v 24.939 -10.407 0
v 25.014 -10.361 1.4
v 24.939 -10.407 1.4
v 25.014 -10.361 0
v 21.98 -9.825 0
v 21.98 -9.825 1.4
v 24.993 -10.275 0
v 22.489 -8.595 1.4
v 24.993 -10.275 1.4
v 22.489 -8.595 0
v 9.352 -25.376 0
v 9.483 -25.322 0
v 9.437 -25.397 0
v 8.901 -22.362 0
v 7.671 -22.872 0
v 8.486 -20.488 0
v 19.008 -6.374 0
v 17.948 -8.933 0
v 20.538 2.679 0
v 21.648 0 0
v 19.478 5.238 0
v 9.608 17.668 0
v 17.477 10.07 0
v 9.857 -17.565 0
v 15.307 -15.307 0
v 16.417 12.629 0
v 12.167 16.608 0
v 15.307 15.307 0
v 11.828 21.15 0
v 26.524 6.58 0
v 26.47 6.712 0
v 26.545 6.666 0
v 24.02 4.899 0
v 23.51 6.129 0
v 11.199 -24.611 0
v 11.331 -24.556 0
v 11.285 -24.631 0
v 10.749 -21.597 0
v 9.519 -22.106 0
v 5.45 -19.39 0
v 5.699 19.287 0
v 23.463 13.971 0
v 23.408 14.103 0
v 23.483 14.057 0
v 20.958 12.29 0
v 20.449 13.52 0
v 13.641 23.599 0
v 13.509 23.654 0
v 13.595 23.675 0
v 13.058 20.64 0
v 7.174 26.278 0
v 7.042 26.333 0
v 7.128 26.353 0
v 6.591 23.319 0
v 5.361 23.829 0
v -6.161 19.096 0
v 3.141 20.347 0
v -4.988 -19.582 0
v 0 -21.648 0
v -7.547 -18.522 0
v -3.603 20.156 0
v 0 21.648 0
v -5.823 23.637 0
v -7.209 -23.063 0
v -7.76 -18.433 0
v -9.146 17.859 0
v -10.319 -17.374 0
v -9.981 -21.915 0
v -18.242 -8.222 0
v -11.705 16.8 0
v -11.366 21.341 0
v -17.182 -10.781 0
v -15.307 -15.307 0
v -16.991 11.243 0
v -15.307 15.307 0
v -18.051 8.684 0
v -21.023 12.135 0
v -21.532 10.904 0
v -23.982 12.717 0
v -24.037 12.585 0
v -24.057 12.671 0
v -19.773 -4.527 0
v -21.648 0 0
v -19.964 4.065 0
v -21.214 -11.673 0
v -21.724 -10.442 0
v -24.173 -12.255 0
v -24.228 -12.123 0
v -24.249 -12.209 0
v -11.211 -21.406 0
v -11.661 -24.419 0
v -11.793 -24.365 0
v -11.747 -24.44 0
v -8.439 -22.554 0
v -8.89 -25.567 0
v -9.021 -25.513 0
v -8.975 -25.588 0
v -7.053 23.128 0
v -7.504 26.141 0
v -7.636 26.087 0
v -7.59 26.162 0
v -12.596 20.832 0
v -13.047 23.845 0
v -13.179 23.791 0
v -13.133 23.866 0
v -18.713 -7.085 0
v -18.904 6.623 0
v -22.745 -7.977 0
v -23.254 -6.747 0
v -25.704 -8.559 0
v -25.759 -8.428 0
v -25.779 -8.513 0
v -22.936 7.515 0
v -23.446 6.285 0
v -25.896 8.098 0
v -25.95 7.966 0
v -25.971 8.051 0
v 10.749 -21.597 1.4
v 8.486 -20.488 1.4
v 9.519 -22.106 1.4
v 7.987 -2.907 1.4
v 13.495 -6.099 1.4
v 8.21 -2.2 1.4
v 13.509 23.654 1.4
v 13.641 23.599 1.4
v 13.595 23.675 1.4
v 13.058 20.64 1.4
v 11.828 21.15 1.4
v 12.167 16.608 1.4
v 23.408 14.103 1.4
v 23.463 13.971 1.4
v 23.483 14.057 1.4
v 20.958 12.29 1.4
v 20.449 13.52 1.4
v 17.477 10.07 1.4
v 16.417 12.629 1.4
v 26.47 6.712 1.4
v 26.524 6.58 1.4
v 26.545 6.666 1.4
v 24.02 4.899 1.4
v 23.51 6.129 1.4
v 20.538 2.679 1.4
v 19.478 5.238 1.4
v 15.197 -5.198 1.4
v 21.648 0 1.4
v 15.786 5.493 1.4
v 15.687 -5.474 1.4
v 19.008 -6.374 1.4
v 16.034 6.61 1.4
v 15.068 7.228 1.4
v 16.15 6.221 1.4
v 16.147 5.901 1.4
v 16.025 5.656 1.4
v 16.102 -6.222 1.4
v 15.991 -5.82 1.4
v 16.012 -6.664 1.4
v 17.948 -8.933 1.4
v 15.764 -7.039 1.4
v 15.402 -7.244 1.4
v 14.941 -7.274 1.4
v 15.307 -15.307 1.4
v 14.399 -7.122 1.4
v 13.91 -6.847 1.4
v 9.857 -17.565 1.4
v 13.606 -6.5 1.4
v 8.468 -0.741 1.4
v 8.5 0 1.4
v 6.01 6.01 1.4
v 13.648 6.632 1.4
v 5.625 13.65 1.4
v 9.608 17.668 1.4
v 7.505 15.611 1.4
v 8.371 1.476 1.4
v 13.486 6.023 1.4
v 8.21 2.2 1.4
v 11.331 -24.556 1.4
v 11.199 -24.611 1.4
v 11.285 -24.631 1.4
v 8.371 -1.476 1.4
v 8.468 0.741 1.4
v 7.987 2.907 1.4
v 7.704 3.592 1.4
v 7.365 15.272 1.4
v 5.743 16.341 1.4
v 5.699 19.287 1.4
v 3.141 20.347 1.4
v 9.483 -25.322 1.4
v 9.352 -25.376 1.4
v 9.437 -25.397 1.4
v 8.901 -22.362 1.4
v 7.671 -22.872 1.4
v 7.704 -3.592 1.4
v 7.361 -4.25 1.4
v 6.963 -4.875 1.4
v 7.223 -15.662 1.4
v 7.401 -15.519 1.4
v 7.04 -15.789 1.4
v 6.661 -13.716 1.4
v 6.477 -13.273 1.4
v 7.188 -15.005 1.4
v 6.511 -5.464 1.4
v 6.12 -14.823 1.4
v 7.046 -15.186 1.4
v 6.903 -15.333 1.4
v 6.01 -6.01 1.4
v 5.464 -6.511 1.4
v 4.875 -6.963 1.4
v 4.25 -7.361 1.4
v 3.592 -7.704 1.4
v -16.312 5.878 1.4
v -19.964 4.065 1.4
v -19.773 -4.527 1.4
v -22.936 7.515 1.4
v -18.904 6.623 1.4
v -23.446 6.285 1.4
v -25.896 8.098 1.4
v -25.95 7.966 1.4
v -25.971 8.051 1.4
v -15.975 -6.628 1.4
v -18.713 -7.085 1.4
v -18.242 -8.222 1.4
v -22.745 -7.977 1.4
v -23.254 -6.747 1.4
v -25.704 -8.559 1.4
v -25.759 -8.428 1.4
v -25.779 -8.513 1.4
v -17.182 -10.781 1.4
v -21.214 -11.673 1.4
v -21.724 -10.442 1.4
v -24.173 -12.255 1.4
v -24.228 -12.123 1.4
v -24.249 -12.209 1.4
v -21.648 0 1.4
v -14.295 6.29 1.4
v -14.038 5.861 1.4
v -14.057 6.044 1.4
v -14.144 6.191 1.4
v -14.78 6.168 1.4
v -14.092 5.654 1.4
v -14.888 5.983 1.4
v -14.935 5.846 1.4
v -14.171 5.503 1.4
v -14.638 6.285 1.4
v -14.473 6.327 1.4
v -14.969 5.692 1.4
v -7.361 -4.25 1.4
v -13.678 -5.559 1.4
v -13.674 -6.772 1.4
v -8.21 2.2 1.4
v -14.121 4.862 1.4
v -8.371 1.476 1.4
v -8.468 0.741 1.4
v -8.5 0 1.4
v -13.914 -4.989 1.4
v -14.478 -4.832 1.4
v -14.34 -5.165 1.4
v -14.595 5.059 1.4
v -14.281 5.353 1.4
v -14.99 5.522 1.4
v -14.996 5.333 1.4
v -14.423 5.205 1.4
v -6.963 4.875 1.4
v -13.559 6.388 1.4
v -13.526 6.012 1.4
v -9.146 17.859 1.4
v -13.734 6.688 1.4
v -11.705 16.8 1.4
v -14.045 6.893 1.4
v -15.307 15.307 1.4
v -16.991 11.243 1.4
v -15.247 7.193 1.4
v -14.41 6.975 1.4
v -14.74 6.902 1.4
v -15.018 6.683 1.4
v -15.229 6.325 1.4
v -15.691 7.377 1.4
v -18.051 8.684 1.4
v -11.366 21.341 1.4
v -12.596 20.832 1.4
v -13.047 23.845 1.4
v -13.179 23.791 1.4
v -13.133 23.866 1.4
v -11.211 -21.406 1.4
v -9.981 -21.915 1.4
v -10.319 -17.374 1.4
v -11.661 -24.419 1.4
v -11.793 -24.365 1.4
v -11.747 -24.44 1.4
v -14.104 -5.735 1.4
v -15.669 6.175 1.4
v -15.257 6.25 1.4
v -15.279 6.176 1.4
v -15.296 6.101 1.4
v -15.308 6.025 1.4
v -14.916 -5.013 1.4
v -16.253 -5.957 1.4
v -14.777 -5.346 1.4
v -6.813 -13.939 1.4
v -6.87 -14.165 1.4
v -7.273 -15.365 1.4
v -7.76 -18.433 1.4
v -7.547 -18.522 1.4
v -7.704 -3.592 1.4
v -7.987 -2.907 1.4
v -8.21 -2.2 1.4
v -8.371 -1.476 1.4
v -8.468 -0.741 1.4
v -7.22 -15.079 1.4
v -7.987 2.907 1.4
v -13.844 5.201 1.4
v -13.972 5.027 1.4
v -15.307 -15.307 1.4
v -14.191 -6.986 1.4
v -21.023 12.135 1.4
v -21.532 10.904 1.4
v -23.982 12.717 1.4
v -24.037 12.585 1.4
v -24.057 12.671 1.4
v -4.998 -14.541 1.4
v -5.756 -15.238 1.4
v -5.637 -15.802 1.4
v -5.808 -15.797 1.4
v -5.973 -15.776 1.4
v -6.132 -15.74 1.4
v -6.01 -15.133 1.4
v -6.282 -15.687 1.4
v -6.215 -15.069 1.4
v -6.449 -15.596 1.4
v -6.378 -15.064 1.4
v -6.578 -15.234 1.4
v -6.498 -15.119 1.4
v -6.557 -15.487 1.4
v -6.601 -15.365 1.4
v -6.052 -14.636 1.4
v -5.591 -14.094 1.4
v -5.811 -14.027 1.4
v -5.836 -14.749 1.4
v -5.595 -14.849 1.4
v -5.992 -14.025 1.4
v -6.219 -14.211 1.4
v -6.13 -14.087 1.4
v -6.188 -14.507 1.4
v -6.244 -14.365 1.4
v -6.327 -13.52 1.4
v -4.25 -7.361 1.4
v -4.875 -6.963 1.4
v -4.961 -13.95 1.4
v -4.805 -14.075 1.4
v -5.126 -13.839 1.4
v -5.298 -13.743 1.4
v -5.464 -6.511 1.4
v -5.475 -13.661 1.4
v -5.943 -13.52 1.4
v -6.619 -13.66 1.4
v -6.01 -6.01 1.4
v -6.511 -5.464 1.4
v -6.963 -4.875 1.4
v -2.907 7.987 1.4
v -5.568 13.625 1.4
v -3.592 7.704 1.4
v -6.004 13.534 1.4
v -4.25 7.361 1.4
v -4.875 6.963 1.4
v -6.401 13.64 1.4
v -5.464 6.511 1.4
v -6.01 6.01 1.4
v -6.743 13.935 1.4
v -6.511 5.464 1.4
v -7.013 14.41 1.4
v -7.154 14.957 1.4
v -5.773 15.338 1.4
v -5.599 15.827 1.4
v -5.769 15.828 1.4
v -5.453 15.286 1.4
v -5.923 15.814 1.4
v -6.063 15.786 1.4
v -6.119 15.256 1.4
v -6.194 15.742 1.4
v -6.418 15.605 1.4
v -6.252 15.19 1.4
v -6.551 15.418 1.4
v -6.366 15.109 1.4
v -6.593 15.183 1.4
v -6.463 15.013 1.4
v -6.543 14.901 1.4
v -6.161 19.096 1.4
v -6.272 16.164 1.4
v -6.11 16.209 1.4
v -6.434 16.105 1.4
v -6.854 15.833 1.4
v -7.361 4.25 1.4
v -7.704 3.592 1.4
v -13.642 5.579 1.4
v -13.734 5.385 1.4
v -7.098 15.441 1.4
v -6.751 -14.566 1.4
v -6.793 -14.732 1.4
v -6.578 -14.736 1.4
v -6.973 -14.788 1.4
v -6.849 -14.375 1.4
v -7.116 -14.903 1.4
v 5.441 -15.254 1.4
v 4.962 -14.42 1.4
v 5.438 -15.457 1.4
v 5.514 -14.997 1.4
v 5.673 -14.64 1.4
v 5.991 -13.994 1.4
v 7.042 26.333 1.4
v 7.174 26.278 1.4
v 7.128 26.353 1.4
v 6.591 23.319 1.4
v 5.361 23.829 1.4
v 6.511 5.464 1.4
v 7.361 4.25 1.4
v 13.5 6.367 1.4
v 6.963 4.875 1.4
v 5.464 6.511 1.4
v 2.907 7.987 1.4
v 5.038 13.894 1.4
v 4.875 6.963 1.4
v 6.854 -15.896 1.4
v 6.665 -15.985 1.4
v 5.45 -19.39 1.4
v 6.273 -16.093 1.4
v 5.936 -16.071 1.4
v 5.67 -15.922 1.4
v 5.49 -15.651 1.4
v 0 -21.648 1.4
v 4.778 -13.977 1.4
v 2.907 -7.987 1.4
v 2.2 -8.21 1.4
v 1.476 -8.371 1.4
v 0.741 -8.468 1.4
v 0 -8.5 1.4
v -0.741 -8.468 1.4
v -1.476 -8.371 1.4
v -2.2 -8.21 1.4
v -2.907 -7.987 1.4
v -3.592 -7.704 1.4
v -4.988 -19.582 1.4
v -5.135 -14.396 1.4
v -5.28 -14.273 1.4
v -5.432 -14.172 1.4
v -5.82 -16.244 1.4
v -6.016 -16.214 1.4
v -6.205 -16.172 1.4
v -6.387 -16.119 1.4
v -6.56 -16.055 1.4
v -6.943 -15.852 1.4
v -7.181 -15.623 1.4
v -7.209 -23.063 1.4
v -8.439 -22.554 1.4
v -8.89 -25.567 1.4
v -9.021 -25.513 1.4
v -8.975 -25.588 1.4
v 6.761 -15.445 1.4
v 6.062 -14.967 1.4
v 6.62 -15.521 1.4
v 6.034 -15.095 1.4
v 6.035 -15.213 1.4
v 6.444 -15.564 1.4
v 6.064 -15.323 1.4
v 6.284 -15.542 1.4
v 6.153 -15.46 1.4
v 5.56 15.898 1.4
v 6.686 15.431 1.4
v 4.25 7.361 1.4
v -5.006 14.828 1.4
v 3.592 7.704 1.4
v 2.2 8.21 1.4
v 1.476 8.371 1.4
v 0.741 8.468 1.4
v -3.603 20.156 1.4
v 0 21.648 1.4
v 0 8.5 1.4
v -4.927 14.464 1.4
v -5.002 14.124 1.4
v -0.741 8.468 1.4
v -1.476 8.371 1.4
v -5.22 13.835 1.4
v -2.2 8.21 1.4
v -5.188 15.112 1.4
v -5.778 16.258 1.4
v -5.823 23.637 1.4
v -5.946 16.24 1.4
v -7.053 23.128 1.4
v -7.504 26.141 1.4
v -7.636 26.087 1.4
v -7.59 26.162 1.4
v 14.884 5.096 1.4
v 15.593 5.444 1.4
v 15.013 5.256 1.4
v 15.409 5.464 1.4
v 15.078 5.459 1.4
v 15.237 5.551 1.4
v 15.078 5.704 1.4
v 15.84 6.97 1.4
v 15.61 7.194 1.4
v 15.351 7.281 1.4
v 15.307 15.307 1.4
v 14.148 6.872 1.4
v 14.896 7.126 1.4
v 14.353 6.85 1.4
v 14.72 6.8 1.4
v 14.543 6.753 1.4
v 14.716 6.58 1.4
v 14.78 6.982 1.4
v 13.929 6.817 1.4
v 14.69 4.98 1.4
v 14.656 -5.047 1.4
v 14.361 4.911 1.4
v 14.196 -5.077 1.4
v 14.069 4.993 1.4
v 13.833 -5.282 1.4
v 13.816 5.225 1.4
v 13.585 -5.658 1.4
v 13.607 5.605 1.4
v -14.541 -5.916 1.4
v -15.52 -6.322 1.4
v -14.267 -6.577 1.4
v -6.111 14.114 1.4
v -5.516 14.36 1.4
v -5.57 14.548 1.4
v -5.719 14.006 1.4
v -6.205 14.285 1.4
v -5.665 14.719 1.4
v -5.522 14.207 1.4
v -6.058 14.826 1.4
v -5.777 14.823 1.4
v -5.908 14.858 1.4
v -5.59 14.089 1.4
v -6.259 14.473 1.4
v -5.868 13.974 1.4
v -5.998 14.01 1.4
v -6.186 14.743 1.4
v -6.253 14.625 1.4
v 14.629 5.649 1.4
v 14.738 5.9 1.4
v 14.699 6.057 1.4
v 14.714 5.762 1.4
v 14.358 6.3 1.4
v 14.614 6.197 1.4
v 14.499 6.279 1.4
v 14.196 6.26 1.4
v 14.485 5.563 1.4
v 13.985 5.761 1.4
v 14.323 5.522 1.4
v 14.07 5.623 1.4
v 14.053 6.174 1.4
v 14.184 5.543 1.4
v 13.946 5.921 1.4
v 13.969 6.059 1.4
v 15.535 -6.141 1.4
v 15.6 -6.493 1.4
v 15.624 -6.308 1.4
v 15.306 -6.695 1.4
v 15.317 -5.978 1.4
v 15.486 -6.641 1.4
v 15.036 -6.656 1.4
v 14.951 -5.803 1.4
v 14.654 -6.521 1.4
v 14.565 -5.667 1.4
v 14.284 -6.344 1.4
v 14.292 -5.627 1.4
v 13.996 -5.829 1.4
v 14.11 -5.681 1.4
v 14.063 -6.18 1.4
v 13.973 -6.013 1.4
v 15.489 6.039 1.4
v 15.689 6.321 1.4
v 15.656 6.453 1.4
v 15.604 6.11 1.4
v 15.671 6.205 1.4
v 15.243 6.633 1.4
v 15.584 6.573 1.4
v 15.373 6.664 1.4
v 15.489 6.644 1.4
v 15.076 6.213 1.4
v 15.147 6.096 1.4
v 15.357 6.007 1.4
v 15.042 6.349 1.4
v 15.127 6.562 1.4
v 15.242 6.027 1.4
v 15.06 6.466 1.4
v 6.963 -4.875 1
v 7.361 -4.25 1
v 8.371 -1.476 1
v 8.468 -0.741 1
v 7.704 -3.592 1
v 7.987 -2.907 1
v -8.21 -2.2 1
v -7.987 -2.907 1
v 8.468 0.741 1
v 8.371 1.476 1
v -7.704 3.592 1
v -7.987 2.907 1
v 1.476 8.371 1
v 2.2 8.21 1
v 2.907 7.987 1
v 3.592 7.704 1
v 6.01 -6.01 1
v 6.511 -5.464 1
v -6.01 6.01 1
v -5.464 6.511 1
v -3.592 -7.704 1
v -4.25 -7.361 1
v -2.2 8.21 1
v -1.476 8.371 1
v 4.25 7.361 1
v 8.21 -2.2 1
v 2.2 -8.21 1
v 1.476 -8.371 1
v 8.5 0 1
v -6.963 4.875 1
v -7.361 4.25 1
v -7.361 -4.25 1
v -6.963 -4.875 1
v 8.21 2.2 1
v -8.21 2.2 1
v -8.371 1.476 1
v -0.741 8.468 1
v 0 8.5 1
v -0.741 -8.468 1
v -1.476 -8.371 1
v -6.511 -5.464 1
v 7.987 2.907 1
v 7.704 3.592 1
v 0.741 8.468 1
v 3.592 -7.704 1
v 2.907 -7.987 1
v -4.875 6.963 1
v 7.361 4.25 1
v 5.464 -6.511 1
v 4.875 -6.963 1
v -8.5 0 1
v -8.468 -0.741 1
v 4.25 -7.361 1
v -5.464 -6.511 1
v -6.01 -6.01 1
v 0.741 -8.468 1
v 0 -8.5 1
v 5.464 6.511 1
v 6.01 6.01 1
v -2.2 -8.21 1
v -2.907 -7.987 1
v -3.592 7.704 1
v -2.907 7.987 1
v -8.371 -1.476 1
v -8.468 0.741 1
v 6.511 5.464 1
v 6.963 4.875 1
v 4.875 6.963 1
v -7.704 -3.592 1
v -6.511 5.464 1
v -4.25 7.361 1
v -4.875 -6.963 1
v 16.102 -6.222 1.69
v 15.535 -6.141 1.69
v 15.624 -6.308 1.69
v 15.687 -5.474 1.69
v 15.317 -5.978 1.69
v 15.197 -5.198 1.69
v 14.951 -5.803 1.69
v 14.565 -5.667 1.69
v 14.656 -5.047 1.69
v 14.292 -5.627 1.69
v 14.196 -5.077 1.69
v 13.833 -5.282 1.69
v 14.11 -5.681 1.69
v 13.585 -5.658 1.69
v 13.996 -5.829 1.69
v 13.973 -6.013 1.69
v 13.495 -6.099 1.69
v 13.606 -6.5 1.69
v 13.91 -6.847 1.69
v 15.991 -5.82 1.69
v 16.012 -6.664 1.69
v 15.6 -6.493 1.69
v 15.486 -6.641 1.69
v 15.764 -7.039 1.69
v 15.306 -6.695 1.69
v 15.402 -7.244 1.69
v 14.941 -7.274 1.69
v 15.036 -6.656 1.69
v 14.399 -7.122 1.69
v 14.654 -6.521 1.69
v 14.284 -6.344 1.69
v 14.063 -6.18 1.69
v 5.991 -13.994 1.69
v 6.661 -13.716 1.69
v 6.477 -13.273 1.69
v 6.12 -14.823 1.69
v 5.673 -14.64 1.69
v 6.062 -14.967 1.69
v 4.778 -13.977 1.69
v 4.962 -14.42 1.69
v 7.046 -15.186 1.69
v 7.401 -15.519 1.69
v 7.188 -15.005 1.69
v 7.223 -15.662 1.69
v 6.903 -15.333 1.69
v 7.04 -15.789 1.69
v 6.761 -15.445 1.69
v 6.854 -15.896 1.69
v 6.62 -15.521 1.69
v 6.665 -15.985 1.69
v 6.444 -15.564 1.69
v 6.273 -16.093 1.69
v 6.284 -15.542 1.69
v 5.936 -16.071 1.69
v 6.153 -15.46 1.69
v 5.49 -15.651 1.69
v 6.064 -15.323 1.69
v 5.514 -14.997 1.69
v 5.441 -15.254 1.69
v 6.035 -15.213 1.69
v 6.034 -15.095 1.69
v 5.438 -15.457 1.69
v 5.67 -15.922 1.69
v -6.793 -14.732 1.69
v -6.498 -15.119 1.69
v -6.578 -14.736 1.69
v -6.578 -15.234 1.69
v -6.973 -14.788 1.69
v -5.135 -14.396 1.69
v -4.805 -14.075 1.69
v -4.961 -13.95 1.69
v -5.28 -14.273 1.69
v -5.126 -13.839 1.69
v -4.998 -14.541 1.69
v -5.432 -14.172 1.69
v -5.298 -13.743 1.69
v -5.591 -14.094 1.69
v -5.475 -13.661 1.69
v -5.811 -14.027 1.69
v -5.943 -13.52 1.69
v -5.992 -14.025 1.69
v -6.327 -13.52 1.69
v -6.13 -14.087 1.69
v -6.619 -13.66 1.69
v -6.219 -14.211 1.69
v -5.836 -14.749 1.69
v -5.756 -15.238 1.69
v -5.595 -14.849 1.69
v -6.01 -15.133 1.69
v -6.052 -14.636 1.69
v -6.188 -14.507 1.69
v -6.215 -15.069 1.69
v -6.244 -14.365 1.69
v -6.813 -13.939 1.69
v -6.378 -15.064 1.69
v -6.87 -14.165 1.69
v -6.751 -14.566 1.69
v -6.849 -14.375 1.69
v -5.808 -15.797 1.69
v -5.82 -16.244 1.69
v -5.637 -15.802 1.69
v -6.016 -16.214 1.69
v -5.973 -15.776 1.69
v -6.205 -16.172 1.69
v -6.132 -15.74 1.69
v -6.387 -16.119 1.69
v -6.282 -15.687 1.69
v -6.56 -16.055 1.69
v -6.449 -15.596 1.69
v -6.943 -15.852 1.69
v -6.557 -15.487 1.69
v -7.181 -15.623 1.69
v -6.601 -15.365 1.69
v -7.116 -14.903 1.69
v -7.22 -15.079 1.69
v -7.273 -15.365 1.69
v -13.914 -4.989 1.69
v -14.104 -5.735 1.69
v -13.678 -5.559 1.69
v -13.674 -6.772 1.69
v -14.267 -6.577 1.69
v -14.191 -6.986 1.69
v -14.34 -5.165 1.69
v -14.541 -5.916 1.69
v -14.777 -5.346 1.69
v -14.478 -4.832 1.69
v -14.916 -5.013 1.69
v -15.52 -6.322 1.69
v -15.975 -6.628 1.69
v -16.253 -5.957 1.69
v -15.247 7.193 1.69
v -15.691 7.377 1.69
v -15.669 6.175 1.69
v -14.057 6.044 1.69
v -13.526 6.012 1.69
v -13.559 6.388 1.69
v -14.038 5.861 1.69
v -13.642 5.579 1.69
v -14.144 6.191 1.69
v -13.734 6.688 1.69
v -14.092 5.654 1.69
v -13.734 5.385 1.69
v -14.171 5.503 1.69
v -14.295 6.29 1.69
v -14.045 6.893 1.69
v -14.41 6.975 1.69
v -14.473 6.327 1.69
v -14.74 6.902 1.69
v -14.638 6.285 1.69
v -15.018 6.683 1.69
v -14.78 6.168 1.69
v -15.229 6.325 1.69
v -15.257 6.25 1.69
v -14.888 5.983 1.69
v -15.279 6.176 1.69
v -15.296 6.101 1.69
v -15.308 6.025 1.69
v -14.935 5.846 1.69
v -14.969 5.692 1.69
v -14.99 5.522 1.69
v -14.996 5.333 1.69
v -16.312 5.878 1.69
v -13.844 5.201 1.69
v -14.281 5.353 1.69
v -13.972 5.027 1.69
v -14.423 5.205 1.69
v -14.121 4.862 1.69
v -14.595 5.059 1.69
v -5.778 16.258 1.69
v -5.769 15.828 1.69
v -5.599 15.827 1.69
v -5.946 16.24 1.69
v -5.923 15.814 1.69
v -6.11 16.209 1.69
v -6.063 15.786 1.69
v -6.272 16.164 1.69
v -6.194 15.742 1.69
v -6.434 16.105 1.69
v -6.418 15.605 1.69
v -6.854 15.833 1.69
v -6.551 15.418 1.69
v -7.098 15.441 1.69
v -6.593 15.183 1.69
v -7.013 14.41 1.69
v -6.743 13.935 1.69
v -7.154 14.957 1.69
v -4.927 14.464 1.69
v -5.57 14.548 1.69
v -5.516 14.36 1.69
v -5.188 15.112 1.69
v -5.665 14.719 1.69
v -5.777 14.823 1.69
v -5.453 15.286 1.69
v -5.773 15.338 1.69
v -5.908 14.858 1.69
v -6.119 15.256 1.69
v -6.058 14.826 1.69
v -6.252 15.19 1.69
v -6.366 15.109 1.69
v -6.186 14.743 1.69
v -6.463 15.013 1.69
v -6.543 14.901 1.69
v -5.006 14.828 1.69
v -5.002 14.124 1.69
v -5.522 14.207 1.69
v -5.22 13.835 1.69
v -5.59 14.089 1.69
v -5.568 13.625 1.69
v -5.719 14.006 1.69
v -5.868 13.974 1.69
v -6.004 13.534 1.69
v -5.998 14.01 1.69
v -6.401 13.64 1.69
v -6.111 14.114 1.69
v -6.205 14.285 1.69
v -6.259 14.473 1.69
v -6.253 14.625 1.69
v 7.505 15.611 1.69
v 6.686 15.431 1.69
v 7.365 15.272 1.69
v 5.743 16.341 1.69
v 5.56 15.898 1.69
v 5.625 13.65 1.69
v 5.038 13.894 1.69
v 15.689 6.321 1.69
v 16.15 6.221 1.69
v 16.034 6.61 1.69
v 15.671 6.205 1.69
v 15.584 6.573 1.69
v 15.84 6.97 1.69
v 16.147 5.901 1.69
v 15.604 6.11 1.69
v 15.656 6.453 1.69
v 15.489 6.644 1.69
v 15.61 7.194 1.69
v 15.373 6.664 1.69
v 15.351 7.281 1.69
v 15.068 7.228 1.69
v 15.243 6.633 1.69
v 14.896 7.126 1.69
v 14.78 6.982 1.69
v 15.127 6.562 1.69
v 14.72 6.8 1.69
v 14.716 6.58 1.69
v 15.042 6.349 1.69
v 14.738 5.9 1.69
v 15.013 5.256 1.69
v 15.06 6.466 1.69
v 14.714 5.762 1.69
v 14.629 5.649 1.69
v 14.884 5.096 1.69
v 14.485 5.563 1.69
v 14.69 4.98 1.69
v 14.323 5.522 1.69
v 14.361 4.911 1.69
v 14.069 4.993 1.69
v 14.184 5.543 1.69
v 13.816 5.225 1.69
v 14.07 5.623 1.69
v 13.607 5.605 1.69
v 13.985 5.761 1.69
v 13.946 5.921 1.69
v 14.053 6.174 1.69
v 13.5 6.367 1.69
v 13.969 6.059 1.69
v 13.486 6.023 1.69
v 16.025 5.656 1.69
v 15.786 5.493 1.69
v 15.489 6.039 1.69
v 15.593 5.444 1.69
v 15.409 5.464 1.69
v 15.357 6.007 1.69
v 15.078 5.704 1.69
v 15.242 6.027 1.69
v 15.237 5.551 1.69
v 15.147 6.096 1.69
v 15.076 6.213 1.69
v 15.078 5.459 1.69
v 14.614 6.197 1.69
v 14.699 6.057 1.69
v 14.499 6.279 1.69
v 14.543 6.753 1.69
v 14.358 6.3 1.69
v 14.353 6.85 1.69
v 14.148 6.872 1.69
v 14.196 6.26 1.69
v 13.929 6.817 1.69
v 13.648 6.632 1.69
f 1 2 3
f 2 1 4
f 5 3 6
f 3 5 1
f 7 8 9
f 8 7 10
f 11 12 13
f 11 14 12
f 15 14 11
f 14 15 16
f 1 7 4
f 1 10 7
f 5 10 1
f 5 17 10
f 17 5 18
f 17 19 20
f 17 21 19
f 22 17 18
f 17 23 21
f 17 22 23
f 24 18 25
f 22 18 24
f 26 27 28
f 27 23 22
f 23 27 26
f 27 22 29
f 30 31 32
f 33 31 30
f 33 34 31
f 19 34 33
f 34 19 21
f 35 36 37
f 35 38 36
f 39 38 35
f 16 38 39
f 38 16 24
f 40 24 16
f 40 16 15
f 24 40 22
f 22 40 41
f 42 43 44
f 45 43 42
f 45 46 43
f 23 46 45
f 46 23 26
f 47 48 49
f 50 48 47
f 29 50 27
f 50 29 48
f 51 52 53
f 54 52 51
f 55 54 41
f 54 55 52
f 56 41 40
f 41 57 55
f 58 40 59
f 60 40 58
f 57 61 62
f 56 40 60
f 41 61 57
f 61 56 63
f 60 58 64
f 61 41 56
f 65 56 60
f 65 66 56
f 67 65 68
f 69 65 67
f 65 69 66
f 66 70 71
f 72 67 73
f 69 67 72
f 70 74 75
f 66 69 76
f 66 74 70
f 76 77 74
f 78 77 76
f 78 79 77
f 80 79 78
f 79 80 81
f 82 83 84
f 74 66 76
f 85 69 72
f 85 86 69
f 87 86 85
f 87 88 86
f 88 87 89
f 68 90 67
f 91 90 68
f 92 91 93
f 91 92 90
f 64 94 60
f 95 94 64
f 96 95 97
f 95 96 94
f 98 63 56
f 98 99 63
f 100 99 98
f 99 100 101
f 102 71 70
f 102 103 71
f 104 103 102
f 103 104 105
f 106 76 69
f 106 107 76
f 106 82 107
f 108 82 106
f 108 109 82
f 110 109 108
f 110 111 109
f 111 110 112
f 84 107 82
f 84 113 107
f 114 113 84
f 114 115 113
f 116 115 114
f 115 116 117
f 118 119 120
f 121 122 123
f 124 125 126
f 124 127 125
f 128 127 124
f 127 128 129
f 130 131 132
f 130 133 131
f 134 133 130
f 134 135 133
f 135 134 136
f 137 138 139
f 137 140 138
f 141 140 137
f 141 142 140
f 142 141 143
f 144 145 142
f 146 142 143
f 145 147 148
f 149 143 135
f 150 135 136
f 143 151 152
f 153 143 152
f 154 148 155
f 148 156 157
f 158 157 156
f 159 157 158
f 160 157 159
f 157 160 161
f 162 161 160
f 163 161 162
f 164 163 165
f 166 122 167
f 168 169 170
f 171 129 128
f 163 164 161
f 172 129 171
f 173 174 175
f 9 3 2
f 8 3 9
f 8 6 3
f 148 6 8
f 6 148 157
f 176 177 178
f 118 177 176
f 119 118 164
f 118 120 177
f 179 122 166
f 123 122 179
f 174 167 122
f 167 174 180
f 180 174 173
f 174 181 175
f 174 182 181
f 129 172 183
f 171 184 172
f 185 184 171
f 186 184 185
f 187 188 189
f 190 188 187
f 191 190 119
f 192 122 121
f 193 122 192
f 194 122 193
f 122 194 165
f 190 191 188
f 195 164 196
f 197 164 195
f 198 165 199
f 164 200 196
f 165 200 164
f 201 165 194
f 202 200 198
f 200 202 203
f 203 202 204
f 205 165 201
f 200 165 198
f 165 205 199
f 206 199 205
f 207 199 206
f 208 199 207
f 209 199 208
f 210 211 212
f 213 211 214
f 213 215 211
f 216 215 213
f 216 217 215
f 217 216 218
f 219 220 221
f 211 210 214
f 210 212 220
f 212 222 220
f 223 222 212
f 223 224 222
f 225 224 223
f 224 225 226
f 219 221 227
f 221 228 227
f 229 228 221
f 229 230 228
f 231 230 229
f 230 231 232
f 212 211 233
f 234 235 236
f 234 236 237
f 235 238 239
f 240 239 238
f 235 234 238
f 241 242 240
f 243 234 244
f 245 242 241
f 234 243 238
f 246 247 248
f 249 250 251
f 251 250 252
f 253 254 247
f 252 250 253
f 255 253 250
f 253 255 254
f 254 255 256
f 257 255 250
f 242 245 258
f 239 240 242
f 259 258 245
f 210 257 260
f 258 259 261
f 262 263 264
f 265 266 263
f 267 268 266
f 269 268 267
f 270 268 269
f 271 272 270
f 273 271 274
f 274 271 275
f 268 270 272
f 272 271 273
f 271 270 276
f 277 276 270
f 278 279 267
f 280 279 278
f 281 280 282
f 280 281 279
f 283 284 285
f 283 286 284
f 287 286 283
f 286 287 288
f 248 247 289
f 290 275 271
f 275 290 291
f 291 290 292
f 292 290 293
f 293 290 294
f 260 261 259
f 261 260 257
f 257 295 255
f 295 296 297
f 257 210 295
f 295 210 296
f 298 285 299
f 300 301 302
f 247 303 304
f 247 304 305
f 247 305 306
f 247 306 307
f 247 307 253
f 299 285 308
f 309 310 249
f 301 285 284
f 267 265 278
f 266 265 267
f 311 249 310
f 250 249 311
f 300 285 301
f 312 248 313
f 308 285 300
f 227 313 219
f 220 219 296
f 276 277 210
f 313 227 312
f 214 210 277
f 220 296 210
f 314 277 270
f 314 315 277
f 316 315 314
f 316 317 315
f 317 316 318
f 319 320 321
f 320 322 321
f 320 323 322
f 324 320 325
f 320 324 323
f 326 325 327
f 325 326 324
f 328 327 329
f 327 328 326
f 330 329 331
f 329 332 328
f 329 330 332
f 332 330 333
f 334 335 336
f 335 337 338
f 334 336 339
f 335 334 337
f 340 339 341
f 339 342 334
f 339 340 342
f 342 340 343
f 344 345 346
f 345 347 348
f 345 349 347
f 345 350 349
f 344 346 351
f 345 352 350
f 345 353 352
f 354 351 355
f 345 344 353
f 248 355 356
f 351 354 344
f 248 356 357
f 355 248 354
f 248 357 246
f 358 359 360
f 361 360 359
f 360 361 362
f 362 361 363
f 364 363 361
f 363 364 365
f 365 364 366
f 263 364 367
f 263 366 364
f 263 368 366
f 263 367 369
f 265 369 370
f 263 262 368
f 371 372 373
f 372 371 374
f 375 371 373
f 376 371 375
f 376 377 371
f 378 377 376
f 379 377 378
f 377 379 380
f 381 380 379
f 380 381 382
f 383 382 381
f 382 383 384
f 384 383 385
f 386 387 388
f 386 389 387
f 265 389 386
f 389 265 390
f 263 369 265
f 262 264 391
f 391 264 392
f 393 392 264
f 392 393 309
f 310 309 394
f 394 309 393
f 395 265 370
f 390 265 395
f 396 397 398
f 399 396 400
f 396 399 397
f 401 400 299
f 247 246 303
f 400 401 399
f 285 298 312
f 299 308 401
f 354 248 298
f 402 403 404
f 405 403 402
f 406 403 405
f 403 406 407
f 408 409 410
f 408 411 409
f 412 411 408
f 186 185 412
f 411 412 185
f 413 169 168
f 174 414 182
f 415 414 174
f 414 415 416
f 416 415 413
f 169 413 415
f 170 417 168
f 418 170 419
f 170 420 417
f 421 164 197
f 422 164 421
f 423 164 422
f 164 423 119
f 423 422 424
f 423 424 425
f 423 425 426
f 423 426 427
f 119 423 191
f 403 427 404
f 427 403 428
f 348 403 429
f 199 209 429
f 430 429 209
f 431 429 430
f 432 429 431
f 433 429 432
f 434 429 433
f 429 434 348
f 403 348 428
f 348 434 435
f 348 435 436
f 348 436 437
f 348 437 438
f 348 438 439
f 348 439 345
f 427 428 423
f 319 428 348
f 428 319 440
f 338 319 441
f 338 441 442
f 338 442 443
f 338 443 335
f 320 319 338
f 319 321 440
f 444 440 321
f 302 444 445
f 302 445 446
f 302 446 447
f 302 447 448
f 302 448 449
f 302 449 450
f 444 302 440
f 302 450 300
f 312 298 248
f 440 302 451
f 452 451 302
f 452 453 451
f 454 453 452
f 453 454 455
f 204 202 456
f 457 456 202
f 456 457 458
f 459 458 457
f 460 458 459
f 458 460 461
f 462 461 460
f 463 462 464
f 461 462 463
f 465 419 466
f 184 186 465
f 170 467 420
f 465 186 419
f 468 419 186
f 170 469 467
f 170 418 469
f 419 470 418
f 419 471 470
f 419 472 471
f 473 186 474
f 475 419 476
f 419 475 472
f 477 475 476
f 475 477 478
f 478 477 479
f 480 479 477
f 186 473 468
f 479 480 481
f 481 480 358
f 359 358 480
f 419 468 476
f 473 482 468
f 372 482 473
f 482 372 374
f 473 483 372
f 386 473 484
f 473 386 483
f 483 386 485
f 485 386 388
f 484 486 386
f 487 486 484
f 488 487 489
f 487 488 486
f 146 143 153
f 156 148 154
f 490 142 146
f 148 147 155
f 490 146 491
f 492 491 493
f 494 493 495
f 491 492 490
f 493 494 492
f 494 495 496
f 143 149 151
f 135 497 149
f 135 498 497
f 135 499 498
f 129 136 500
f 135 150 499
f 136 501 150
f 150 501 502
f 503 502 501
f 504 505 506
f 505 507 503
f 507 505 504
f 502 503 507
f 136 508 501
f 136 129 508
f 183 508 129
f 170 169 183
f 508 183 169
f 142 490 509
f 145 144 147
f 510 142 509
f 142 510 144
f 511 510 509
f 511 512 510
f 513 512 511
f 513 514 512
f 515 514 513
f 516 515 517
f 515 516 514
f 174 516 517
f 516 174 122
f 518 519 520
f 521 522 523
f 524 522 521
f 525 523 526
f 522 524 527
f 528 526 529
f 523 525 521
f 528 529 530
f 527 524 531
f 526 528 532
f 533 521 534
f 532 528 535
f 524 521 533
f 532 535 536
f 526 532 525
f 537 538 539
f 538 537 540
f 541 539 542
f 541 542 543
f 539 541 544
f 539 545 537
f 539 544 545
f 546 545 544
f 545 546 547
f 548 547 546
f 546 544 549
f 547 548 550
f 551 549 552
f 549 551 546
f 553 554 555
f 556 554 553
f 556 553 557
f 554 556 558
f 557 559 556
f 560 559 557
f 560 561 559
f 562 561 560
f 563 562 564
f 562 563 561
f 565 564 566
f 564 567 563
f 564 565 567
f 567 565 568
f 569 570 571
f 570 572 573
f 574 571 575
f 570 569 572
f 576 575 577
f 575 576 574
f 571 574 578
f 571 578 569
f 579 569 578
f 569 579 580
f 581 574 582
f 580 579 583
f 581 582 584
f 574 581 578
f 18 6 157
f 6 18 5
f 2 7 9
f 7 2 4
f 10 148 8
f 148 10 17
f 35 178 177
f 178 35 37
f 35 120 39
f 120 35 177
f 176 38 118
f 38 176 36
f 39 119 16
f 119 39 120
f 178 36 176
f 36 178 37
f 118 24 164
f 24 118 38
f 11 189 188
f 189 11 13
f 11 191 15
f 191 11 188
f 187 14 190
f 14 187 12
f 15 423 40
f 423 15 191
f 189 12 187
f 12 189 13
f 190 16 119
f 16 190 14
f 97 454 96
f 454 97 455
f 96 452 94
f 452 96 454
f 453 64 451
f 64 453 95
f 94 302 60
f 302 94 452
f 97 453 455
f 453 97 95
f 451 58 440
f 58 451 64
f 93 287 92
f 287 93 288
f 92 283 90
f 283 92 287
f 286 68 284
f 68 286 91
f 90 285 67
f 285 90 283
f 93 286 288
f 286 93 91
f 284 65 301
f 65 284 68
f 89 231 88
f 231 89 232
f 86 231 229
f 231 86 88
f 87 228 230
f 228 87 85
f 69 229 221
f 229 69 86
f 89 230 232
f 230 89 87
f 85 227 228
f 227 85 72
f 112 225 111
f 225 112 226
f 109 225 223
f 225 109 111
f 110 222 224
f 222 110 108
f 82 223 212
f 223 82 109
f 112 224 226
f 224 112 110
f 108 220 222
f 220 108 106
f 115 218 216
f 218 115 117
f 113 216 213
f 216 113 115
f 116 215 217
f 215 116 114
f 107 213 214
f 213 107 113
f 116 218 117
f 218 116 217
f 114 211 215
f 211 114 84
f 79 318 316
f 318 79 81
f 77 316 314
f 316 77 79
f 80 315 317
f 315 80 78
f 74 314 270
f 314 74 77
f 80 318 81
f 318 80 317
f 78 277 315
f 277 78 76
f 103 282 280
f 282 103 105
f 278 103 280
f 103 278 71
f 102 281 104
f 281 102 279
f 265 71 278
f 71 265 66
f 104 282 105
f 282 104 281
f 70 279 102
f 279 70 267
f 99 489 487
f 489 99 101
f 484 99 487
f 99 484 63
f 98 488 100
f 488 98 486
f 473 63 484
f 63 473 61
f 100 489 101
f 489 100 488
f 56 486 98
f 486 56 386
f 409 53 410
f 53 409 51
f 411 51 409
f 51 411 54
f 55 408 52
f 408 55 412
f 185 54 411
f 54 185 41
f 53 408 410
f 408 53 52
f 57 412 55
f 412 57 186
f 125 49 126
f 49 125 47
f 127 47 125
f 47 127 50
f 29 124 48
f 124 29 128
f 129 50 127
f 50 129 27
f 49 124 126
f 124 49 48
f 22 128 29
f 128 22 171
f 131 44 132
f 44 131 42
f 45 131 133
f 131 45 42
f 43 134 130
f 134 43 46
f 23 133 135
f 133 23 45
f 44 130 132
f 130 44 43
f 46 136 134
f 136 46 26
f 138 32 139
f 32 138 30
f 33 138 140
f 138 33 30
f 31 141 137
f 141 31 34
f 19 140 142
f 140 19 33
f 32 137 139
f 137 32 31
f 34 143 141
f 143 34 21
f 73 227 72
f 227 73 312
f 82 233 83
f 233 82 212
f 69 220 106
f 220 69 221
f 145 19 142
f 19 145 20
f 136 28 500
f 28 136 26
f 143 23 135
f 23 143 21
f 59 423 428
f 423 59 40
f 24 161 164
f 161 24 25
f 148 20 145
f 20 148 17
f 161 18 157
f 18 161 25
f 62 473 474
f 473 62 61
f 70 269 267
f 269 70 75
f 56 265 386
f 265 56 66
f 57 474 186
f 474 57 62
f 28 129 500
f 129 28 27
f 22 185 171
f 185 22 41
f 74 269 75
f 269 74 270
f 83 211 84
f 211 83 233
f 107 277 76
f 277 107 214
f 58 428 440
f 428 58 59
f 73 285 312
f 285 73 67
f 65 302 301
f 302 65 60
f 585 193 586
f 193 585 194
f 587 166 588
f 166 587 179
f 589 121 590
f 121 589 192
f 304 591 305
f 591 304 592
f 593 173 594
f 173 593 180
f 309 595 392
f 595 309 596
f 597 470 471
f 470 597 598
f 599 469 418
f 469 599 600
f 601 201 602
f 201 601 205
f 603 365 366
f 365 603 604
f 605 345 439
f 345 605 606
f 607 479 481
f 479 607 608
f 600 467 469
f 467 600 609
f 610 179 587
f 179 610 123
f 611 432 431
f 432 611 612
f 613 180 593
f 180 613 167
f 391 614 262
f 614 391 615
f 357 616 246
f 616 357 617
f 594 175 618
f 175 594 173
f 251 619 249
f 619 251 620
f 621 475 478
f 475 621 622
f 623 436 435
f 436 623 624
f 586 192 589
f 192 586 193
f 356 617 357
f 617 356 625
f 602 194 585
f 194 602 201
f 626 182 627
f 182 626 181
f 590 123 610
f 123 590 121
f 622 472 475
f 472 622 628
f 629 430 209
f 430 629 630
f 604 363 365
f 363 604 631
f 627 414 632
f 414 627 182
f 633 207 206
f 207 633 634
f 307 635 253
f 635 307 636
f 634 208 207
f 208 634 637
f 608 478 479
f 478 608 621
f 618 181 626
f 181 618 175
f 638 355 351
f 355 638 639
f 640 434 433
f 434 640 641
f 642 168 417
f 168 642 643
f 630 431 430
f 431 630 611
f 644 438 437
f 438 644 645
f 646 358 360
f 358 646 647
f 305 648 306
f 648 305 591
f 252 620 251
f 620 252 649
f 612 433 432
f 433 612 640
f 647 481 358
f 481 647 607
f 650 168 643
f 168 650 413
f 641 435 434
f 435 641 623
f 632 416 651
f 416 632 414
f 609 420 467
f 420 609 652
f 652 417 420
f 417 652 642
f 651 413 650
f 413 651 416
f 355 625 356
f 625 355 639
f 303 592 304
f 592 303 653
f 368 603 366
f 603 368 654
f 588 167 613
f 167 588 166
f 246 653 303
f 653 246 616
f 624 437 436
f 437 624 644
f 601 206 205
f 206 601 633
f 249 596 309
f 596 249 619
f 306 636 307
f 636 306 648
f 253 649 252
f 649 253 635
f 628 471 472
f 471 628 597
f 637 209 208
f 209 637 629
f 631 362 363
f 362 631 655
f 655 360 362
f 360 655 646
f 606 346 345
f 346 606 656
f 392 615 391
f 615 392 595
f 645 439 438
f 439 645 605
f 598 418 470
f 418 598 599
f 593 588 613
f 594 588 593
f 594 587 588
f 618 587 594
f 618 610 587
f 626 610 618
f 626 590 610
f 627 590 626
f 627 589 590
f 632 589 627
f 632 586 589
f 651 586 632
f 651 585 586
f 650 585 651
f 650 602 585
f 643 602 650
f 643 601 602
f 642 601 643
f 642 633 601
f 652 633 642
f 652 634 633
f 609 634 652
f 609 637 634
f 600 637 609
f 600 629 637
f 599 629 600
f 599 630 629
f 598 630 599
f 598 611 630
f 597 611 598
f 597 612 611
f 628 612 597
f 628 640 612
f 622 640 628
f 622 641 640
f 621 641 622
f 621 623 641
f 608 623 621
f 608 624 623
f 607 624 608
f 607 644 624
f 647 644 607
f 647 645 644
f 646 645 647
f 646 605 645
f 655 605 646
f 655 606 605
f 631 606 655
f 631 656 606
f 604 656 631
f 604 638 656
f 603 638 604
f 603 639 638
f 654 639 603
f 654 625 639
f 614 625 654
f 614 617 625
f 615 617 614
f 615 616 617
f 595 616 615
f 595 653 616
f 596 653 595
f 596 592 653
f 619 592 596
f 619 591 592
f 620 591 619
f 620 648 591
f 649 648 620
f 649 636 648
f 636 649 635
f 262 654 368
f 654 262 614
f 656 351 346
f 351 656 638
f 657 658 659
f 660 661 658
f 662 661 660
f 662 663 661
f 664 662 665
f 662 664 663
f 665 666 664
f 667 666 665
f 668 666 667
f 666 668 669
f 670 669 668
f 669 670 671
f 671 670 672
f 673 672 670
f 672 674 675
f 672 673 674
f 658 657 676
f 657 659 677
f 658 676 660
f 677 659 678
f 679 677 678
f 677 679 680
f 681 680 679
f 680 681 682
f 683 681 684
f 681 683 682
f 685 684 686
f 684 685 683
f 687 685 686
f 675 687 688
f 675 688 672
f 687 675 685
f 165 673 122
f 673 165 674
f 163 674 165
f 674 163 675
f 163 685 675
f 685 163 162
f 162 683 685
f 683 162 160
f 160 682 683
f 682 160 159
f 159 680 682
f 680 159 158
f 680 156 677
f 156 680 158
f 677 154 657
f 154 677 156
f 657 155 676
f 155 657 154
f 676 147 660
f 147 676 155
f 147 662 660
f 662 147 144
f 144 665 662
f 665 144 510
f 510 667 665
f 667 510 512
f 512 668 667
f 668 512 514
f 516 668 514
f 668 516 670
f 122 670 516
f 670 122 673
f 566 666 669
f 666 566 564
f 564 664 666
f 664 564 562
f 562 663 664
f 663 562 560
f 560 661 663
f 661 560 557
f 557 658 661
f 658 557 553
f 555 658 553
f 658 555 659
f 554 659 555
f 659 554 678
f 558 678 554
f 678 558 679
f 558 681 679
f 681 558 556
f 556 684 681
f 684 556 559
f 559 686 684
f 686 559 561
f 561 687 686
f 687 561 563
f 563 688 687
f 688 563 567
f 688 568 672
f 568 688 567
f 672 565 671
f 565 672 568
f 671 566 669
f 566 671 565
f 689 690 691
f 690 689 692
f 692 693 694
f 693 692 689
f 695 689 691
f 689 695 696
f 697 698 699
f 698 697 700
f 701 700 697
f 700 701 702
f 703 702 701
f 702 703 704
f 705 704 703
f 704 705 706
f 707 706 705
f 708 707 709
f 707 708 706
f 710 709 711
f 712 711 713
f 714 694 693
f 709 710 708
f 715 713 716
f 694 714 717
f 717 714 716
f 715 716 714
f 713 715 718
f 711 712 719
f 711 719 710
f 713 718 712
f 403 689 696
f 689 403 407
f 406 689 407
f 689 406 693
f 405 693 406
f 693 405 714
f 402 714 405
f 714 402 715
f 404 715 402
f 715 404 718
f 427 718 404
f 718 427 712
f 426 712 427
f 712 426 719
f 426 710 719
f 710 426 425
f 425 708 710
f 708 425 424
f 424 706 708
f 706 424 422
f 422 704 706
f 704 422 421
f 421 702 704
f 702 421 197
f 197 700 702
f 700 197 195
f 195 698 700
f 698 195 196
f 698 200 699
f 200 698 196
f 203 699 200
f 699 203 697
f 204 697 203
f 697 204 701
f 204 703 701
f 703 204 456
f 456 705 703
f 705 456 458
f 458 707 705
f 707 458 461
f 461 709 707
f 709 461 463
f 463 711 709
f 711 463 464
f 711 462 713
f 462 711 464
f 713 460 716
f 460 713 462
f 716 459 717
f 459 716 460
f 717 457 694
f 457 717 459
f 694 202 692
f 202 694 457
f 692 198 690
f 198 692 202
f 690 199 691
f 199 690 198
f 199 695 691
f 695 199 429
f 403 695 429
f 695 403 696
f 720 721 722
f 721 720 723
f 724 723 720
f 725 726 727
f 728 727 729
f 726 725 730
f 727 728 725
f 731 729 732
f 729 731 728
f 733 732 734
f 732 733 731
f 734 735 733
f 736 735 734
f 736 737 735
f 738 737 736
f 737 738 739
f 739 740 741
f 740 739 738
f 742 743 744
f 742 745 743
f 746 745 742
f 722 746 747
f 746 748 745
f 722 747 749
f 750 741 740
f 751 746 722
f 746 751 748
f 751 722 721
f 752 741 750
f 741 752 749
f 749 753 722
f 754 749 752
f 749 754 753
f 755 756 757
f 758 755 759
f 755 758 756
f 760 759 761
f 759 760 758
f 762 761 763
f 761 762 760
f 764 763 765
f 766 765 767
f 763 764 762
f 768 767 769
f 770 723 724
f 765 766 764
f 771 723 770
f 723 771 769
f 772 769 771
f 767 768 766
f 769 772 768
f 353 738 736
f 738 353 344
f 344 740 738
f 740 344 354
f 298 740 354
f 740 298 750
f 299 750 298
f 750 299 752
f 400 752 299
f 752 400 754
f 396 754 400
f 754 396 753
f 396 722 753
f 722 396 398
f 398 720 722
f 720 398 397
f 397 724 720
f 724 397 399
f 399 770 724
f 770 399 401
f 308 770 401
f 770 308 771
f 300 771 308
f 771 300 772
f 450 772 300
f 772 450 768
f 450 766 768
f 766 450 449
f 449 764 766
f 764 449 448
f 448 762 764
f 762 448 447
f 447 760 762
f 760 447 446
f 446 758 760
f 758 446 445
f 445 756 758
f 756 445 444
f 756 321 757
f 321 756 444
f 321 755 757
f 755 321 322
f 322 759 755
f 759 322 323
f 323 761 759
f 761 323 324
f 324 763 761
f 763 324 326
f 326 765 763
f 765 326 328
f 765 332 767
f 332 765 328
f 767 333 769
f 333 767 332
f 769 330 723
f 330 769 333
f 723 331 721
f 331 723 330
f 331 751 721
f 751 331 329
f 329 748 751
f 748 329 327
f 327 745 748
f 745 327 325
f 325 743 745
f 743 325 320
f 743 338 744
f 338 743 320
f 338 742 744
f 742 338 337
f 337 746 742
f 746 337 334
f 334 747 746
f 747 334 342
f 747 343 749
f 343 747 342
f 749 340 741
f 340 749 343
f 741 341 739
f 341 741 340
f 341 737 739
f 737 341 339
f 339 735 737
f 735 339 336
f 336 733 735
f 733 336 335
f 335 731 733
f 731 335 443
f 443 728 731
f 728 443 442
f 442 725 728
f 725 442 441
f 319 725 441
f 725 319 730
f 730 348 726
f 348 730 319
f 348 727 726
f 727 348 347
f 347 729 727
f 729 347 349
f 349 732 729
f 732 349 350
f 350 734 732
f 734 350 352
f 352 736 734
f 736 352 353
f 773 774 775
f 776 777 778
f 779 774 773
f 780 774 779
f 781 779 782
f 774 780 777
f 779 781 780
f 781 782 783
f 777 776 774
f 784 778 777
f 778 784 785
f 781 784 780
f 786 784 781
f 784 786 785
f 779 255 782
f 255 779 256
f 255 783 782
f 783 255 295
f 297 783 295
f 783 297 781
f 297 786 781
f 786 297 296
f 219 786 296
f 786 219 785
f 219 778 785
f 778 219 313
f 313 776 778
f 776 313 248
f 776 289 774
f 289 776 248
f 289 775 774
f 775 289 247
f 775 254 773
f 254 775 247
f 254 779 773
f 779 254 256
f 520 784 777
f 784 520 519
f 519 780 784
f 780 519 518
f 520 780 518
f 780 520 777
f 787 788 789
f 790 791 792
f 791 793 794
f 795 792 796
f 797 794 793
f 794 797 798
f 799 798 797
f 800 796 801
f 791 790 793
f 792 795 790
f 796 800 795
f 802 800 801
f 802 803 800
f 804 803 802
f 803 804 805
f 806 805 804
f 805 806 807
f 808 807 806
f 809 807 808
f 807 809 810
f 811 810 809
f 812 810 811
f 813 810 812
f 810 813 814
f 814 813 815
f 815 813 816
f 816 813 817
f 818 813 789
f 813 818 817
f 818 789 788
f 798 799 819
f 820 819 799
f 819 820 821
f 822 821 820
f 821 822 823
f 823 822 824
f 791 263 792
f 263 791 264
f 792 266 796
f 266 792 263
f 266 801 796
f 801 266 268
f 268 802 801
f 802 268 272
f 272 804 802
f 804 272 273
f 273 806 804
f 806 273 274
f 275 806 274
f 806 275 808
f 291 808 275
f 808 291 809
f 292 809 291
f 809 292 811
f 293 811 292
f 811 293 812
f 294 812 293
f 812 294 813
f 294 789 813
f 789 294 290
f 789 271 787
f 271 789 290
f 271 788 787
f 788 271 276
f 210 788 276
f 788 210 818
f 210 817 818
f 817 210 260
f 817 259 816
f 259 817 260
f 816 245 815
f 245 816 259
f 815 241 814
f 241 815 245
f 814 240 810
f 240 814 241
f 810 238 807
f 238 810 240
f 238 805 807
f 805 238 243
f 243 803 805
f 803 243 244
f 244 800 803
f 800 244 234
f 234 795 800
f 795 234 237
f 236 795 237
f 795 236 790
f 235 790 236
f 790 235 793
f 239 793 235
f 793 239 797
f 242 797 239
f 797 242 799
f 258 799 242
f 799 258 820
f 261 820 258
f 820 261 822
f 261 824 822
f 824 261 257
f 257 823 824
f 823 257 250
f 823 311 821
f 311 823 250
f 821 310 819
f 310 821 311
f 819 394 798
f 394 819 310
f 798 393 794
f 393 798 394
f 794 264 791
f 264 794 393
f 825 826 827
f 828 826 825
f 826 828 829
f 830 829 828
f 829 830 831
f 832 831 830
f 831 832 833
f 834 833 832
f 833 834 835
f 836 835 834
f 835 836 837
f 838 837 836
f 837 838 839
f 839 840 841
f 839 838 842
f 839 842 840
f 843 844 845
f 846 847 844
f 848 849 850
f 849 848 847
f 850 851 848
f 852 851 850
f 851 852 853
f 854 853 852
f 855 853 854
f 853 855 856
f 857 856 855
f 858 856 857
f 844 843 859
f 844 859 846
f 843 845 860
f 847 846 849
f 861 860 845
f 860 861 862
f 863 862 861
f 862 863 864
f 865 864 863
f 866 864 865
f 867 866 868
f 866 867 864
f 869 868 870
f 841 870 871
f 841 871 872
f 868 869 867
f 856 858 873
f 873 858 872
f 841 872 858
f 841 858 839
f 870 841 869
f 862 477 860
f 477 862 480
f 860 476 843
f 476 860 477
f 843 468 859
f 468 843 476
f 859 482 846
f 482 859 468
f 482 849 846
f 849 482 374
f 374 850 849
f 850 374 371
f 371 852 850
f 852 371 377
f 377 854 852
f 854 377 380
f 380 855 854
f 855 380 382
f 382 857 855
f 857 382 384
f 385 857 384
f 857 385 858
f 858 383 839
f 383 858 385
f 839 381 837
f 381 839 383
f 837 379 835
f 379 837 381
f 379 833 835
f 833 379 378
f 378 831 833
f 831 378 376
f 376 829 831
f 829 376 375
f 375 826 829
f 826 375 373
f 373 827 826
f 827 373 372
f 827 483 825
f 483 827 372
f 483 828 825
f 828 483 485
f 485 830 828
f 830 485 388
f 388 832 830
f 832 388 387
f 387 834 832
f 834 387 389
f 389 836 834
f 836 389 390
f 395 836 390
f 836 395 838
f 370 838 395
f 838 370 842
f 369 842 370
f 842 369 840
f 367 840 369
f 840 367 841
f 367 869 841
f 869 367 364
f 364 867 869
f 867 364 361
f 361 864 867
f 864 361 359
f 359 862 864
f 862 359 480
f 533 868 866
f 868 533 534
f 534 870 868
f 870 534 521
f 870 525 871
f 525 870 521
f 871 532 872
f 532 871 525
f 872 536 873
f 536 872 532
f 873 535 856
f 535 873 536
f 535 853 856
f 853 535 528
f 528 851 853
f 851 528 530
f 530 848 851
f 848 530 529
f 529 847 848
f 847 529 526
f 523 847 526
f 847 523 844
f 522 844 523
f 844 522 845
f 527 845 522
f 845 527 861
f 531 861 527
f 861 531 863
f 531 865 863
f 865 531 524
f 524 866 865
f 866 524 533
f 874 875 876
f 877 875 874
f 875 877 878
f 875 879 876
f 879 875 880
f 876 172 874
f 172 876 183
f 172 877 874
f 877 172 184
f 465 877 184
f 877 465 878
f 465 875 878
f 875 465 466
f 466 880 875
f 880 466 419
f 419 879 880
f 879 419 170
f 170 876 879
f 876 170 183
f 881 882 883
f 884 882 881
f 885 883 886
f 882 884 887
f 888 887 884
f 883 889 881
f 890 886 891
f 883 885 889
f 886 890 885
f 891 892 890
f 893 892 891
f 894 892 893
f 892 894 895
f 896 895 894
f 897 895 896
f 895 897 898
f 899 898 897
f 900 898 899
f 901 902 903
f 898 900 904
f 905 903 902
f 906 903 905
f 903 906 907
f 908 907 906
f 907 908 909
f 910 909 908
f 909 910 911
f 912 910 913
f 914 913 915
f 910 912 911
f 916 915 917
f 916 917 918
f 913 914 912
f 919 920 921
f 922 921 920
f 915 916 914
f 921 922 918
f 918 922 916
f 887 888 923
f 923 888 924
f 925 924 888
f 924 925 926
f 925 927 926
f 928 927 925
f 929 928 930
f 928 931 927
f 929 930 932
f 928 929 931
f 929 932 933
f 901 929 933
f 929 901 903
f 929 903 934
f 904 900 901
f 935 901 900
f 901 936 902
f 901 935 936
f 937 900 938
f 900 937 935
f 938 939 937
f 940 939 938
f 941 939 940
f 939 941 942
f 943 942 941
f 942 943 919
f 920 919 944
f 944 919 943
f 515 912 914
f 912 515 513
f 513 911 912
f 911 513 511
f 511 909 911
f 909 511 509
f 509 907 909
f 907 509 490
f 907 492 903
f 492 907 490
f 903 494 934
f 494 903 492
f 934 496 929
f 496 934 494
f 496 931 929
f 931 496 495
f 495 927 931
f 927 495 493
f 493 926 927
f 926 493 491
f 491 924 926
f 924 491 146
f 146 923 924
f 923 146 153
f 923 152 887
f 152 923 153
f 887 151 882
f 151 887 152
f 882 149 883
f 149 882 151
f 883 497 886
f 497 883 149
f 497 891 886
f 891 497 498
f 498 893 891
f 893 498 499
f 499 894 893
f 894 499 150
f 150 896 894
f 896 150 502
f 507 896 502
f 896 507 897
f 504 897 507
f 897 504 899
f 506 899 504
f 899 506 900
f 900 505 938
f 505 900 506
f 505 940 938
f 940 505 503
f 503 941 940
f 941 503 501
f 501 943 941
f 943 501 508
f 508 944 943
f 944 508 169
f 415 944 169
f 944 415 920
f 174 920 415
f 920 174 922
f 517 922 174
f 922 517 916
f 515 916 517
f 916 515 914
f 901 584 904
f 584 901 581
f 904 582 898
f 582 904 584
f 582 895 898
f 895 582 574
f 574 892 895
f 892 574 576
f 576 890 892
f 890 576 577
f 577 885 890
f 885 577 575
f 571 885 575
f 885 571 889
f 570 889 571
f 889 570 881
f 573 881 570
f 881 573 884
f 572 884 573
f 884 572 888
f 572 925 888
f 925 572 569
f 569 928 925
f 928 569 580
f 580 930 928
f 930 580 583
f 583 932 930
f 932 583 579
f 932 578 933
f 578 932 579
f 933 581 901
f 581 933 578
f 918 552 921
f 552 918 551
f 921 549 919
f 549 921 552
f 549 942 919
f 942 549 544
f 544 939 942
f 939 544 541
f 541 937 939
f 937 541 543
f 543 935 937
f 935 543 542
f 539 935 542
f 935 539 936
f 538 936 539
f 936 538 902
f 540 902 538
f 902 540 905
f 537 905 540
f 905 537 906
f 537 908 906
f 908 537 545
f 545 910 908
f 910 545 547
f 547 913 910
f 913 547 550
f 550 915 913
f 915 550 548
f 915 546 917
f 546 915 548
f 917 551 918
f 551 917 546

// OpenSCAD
// 2-Point Discrimination Wheel — parametric n-gon, clockwise order
distances_mm       = is_undef(distances_mm) ? [0,2,3,4,5,6,7,8] : distances_mm;
outer_flat_to_flat = is_undef(outer_flat_to_flat) ? 40 : outer_flat_to_flat;
base_thickness     = is_undef(base_thickness) ? 1.4 : base_thickness;
spike_length  = is_undef(spike_length) ? 7 : spike_length;
base_d        = is_undef(base_d) ? 3 : base_d;
shank_d       = is_undef(shank_d) ? 1.4 : shank_d;
tip_d         = is_undef(tip_d) ? 0.15 : tip_d;
root_overlap  = is_undef(root_overlap) ? .7 : root_overlap;
label_size    = is_undef(label_size) ? 2.5 : label_size;
label_depth   = is_undef(label_depth) ? .3 : label_depth;
font_name     = is_undef(font_name) ? "DejaVu Sans:style=Bold" : font_name;
label_radial  = is_undef(label_radial) ? 0.80 : label_radial;
hub_diameter  = is_undef(hub_diameter) ? 17 : hub_diameter;
thumb_depth   = is_undef(thumb_depth) ? 1.2 : thumb_depth;
chamfer = is_undef(chamfer) ? 0.8 : chamfer;
$fn = is_undef($fn) ? 72 : $fn;

module soft_chamfer(h=chamfer){
  if (h>0) minkowski(){ children(); cylinder(h=h,r1=h,r2=0,$fn=24); }
  else children();
}
function apothem(across_flats,n)=across_flats/2;
function circ_radius(across_flats,n)=across_flats/(2*cos(180/n));
function total_thickness()=base_thickness+max(chamfer,0);

module polygon_plate(n, across_flats, thk){
  r = circ_radius(across_flats,n);
  linear_extrude(thk)
    polygon(points=[for(i=[0:n-1]) let(a=360*i/n)[r*cos(a), r*sin(a)]]);
}


module spike_single_flat(len=spike_length,bd=base_d,sd=shank_d,td=tip_d){
  base_r=bd/2; shank_r=sd/2; tip_r=td/2;
  bx=-root_overlap; sx=len*0.55; tx=len;
  linear_extrude(height=base_thickness)
  union(){
    translate([bx,0]) circle(r=base_r);
    hull(){translate([bx,0])circle(r=base_r);translate([sx,0])circle(r=shank_r);}
    hull(){translate([sx,0])circle(r=shank_r);translate([tx,0])circle(r=tip_r);}
  }
}

module thumb_well_top(){
  translate([0,0,total_thickness()-thumb_depth])
    cylinder(h=thumb_depth,d=hub_diameter,$fn=72);
}

module edge_numbers_top(distances,a){
  n=len(distances);
  for(i=[0:n-1]){
    angN=-360*(i+0.5)/n;
    translate([(label_radial*a)*cos(angN),
               (label_radial*a)*sin(angN),
               base_thickness - 0.01])
      rotate([0,0,angN-90])
        linear_extrude(height=label_depth)
          text(str(distances[i]),
               size=label_size,font=font_name,
               halign="center",valign="center");
  }
}


module wheel_solid(distances){
  n=len(distances);
  a=apothem(outer_flat_to_flat,n);
  union(){
    polygon_plate(n,outer_flat_to_flat,base_thickness);
    for(i=[0:n-1]){
      angN=-360*(i+0.5)/n;
      translate([a*cos(angN),a*sin(angN),0])
        rotate([0,0,angN]){
          sep=distances[i];
          translate([0,+sep/2,0])spike_single_flat();
          translate([0,-sep/2,0])spike_single_flat();
        }
    }
  }
}

module discriminator(distances){
  n=len(distances);
  assert(n>=3,"distances_mm must have at least 3 entries.");

  union(){
    difference(){
      wheel_solid(distances);
      thumb_well_top();
    }
    edge_numbers_top(distances, apothem(outer_flat_to_flat,n));
  }
}
discriminator(distances_mm);
